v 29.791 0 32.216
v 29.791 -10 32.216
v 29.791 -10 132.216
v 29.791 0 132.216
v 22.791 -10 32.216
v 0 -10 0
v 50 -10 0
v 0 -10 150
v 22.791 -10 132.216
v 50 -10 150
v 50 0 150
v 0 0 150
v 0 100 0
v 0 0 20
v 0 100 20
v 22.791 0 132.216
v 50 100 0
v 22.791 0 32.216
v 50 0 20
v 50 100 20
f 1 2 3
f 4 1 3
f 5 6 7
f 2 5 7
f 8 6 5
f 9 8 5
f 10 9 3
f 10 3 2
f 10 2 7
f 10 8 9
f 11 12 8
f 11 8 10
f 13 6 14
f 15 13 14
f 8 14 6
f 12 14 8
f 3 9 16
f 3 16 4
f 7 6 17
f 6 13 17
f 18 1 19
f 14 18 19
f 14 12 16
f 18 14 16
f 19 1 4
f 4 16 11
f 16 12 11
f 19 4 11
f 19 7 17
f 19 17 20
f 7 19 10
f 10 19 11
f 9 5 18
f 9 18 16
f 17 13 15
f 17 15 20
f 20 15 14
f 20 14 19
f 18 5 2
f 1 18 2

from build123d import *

# Parameters (mm, degrees)
F0_W     = 50
F0_H     = 100
F1_DEPTH = 20
F2_W     = 50
F2_H     = 150
F3_DEPTH = 10
F5_W     = 7
F5_H     = 100
F6_DEPTH = 25


with BuildPart() as f1:
    # F0 (on Top) → F1 (new body)
    with BuildSketch(Plane.XY):
        with Locations((25, 50)):
            Rectangle(F0_W, F0_H)
    extrude(amount=F1_DEPTH)

    # F2 (on Front) → F3 (join)
    with BuildSketch(Plane.XZ):
        with Locations((25, 75)):
            Rectangle(F2_W, F2_H)
    extrude(amount=F3_DEPTH)

    # F5 (on face) → F6 (cut)
    with BuildSketch(Plane.XZ.offset(10)):
        with Locations((26.290544, 82.216139)):
            Rectangle(F5_W, F5_H)
    extrude(amount=-F6_DEPTH, mode=Mode.SUBTRACT)


solid = f1.part
